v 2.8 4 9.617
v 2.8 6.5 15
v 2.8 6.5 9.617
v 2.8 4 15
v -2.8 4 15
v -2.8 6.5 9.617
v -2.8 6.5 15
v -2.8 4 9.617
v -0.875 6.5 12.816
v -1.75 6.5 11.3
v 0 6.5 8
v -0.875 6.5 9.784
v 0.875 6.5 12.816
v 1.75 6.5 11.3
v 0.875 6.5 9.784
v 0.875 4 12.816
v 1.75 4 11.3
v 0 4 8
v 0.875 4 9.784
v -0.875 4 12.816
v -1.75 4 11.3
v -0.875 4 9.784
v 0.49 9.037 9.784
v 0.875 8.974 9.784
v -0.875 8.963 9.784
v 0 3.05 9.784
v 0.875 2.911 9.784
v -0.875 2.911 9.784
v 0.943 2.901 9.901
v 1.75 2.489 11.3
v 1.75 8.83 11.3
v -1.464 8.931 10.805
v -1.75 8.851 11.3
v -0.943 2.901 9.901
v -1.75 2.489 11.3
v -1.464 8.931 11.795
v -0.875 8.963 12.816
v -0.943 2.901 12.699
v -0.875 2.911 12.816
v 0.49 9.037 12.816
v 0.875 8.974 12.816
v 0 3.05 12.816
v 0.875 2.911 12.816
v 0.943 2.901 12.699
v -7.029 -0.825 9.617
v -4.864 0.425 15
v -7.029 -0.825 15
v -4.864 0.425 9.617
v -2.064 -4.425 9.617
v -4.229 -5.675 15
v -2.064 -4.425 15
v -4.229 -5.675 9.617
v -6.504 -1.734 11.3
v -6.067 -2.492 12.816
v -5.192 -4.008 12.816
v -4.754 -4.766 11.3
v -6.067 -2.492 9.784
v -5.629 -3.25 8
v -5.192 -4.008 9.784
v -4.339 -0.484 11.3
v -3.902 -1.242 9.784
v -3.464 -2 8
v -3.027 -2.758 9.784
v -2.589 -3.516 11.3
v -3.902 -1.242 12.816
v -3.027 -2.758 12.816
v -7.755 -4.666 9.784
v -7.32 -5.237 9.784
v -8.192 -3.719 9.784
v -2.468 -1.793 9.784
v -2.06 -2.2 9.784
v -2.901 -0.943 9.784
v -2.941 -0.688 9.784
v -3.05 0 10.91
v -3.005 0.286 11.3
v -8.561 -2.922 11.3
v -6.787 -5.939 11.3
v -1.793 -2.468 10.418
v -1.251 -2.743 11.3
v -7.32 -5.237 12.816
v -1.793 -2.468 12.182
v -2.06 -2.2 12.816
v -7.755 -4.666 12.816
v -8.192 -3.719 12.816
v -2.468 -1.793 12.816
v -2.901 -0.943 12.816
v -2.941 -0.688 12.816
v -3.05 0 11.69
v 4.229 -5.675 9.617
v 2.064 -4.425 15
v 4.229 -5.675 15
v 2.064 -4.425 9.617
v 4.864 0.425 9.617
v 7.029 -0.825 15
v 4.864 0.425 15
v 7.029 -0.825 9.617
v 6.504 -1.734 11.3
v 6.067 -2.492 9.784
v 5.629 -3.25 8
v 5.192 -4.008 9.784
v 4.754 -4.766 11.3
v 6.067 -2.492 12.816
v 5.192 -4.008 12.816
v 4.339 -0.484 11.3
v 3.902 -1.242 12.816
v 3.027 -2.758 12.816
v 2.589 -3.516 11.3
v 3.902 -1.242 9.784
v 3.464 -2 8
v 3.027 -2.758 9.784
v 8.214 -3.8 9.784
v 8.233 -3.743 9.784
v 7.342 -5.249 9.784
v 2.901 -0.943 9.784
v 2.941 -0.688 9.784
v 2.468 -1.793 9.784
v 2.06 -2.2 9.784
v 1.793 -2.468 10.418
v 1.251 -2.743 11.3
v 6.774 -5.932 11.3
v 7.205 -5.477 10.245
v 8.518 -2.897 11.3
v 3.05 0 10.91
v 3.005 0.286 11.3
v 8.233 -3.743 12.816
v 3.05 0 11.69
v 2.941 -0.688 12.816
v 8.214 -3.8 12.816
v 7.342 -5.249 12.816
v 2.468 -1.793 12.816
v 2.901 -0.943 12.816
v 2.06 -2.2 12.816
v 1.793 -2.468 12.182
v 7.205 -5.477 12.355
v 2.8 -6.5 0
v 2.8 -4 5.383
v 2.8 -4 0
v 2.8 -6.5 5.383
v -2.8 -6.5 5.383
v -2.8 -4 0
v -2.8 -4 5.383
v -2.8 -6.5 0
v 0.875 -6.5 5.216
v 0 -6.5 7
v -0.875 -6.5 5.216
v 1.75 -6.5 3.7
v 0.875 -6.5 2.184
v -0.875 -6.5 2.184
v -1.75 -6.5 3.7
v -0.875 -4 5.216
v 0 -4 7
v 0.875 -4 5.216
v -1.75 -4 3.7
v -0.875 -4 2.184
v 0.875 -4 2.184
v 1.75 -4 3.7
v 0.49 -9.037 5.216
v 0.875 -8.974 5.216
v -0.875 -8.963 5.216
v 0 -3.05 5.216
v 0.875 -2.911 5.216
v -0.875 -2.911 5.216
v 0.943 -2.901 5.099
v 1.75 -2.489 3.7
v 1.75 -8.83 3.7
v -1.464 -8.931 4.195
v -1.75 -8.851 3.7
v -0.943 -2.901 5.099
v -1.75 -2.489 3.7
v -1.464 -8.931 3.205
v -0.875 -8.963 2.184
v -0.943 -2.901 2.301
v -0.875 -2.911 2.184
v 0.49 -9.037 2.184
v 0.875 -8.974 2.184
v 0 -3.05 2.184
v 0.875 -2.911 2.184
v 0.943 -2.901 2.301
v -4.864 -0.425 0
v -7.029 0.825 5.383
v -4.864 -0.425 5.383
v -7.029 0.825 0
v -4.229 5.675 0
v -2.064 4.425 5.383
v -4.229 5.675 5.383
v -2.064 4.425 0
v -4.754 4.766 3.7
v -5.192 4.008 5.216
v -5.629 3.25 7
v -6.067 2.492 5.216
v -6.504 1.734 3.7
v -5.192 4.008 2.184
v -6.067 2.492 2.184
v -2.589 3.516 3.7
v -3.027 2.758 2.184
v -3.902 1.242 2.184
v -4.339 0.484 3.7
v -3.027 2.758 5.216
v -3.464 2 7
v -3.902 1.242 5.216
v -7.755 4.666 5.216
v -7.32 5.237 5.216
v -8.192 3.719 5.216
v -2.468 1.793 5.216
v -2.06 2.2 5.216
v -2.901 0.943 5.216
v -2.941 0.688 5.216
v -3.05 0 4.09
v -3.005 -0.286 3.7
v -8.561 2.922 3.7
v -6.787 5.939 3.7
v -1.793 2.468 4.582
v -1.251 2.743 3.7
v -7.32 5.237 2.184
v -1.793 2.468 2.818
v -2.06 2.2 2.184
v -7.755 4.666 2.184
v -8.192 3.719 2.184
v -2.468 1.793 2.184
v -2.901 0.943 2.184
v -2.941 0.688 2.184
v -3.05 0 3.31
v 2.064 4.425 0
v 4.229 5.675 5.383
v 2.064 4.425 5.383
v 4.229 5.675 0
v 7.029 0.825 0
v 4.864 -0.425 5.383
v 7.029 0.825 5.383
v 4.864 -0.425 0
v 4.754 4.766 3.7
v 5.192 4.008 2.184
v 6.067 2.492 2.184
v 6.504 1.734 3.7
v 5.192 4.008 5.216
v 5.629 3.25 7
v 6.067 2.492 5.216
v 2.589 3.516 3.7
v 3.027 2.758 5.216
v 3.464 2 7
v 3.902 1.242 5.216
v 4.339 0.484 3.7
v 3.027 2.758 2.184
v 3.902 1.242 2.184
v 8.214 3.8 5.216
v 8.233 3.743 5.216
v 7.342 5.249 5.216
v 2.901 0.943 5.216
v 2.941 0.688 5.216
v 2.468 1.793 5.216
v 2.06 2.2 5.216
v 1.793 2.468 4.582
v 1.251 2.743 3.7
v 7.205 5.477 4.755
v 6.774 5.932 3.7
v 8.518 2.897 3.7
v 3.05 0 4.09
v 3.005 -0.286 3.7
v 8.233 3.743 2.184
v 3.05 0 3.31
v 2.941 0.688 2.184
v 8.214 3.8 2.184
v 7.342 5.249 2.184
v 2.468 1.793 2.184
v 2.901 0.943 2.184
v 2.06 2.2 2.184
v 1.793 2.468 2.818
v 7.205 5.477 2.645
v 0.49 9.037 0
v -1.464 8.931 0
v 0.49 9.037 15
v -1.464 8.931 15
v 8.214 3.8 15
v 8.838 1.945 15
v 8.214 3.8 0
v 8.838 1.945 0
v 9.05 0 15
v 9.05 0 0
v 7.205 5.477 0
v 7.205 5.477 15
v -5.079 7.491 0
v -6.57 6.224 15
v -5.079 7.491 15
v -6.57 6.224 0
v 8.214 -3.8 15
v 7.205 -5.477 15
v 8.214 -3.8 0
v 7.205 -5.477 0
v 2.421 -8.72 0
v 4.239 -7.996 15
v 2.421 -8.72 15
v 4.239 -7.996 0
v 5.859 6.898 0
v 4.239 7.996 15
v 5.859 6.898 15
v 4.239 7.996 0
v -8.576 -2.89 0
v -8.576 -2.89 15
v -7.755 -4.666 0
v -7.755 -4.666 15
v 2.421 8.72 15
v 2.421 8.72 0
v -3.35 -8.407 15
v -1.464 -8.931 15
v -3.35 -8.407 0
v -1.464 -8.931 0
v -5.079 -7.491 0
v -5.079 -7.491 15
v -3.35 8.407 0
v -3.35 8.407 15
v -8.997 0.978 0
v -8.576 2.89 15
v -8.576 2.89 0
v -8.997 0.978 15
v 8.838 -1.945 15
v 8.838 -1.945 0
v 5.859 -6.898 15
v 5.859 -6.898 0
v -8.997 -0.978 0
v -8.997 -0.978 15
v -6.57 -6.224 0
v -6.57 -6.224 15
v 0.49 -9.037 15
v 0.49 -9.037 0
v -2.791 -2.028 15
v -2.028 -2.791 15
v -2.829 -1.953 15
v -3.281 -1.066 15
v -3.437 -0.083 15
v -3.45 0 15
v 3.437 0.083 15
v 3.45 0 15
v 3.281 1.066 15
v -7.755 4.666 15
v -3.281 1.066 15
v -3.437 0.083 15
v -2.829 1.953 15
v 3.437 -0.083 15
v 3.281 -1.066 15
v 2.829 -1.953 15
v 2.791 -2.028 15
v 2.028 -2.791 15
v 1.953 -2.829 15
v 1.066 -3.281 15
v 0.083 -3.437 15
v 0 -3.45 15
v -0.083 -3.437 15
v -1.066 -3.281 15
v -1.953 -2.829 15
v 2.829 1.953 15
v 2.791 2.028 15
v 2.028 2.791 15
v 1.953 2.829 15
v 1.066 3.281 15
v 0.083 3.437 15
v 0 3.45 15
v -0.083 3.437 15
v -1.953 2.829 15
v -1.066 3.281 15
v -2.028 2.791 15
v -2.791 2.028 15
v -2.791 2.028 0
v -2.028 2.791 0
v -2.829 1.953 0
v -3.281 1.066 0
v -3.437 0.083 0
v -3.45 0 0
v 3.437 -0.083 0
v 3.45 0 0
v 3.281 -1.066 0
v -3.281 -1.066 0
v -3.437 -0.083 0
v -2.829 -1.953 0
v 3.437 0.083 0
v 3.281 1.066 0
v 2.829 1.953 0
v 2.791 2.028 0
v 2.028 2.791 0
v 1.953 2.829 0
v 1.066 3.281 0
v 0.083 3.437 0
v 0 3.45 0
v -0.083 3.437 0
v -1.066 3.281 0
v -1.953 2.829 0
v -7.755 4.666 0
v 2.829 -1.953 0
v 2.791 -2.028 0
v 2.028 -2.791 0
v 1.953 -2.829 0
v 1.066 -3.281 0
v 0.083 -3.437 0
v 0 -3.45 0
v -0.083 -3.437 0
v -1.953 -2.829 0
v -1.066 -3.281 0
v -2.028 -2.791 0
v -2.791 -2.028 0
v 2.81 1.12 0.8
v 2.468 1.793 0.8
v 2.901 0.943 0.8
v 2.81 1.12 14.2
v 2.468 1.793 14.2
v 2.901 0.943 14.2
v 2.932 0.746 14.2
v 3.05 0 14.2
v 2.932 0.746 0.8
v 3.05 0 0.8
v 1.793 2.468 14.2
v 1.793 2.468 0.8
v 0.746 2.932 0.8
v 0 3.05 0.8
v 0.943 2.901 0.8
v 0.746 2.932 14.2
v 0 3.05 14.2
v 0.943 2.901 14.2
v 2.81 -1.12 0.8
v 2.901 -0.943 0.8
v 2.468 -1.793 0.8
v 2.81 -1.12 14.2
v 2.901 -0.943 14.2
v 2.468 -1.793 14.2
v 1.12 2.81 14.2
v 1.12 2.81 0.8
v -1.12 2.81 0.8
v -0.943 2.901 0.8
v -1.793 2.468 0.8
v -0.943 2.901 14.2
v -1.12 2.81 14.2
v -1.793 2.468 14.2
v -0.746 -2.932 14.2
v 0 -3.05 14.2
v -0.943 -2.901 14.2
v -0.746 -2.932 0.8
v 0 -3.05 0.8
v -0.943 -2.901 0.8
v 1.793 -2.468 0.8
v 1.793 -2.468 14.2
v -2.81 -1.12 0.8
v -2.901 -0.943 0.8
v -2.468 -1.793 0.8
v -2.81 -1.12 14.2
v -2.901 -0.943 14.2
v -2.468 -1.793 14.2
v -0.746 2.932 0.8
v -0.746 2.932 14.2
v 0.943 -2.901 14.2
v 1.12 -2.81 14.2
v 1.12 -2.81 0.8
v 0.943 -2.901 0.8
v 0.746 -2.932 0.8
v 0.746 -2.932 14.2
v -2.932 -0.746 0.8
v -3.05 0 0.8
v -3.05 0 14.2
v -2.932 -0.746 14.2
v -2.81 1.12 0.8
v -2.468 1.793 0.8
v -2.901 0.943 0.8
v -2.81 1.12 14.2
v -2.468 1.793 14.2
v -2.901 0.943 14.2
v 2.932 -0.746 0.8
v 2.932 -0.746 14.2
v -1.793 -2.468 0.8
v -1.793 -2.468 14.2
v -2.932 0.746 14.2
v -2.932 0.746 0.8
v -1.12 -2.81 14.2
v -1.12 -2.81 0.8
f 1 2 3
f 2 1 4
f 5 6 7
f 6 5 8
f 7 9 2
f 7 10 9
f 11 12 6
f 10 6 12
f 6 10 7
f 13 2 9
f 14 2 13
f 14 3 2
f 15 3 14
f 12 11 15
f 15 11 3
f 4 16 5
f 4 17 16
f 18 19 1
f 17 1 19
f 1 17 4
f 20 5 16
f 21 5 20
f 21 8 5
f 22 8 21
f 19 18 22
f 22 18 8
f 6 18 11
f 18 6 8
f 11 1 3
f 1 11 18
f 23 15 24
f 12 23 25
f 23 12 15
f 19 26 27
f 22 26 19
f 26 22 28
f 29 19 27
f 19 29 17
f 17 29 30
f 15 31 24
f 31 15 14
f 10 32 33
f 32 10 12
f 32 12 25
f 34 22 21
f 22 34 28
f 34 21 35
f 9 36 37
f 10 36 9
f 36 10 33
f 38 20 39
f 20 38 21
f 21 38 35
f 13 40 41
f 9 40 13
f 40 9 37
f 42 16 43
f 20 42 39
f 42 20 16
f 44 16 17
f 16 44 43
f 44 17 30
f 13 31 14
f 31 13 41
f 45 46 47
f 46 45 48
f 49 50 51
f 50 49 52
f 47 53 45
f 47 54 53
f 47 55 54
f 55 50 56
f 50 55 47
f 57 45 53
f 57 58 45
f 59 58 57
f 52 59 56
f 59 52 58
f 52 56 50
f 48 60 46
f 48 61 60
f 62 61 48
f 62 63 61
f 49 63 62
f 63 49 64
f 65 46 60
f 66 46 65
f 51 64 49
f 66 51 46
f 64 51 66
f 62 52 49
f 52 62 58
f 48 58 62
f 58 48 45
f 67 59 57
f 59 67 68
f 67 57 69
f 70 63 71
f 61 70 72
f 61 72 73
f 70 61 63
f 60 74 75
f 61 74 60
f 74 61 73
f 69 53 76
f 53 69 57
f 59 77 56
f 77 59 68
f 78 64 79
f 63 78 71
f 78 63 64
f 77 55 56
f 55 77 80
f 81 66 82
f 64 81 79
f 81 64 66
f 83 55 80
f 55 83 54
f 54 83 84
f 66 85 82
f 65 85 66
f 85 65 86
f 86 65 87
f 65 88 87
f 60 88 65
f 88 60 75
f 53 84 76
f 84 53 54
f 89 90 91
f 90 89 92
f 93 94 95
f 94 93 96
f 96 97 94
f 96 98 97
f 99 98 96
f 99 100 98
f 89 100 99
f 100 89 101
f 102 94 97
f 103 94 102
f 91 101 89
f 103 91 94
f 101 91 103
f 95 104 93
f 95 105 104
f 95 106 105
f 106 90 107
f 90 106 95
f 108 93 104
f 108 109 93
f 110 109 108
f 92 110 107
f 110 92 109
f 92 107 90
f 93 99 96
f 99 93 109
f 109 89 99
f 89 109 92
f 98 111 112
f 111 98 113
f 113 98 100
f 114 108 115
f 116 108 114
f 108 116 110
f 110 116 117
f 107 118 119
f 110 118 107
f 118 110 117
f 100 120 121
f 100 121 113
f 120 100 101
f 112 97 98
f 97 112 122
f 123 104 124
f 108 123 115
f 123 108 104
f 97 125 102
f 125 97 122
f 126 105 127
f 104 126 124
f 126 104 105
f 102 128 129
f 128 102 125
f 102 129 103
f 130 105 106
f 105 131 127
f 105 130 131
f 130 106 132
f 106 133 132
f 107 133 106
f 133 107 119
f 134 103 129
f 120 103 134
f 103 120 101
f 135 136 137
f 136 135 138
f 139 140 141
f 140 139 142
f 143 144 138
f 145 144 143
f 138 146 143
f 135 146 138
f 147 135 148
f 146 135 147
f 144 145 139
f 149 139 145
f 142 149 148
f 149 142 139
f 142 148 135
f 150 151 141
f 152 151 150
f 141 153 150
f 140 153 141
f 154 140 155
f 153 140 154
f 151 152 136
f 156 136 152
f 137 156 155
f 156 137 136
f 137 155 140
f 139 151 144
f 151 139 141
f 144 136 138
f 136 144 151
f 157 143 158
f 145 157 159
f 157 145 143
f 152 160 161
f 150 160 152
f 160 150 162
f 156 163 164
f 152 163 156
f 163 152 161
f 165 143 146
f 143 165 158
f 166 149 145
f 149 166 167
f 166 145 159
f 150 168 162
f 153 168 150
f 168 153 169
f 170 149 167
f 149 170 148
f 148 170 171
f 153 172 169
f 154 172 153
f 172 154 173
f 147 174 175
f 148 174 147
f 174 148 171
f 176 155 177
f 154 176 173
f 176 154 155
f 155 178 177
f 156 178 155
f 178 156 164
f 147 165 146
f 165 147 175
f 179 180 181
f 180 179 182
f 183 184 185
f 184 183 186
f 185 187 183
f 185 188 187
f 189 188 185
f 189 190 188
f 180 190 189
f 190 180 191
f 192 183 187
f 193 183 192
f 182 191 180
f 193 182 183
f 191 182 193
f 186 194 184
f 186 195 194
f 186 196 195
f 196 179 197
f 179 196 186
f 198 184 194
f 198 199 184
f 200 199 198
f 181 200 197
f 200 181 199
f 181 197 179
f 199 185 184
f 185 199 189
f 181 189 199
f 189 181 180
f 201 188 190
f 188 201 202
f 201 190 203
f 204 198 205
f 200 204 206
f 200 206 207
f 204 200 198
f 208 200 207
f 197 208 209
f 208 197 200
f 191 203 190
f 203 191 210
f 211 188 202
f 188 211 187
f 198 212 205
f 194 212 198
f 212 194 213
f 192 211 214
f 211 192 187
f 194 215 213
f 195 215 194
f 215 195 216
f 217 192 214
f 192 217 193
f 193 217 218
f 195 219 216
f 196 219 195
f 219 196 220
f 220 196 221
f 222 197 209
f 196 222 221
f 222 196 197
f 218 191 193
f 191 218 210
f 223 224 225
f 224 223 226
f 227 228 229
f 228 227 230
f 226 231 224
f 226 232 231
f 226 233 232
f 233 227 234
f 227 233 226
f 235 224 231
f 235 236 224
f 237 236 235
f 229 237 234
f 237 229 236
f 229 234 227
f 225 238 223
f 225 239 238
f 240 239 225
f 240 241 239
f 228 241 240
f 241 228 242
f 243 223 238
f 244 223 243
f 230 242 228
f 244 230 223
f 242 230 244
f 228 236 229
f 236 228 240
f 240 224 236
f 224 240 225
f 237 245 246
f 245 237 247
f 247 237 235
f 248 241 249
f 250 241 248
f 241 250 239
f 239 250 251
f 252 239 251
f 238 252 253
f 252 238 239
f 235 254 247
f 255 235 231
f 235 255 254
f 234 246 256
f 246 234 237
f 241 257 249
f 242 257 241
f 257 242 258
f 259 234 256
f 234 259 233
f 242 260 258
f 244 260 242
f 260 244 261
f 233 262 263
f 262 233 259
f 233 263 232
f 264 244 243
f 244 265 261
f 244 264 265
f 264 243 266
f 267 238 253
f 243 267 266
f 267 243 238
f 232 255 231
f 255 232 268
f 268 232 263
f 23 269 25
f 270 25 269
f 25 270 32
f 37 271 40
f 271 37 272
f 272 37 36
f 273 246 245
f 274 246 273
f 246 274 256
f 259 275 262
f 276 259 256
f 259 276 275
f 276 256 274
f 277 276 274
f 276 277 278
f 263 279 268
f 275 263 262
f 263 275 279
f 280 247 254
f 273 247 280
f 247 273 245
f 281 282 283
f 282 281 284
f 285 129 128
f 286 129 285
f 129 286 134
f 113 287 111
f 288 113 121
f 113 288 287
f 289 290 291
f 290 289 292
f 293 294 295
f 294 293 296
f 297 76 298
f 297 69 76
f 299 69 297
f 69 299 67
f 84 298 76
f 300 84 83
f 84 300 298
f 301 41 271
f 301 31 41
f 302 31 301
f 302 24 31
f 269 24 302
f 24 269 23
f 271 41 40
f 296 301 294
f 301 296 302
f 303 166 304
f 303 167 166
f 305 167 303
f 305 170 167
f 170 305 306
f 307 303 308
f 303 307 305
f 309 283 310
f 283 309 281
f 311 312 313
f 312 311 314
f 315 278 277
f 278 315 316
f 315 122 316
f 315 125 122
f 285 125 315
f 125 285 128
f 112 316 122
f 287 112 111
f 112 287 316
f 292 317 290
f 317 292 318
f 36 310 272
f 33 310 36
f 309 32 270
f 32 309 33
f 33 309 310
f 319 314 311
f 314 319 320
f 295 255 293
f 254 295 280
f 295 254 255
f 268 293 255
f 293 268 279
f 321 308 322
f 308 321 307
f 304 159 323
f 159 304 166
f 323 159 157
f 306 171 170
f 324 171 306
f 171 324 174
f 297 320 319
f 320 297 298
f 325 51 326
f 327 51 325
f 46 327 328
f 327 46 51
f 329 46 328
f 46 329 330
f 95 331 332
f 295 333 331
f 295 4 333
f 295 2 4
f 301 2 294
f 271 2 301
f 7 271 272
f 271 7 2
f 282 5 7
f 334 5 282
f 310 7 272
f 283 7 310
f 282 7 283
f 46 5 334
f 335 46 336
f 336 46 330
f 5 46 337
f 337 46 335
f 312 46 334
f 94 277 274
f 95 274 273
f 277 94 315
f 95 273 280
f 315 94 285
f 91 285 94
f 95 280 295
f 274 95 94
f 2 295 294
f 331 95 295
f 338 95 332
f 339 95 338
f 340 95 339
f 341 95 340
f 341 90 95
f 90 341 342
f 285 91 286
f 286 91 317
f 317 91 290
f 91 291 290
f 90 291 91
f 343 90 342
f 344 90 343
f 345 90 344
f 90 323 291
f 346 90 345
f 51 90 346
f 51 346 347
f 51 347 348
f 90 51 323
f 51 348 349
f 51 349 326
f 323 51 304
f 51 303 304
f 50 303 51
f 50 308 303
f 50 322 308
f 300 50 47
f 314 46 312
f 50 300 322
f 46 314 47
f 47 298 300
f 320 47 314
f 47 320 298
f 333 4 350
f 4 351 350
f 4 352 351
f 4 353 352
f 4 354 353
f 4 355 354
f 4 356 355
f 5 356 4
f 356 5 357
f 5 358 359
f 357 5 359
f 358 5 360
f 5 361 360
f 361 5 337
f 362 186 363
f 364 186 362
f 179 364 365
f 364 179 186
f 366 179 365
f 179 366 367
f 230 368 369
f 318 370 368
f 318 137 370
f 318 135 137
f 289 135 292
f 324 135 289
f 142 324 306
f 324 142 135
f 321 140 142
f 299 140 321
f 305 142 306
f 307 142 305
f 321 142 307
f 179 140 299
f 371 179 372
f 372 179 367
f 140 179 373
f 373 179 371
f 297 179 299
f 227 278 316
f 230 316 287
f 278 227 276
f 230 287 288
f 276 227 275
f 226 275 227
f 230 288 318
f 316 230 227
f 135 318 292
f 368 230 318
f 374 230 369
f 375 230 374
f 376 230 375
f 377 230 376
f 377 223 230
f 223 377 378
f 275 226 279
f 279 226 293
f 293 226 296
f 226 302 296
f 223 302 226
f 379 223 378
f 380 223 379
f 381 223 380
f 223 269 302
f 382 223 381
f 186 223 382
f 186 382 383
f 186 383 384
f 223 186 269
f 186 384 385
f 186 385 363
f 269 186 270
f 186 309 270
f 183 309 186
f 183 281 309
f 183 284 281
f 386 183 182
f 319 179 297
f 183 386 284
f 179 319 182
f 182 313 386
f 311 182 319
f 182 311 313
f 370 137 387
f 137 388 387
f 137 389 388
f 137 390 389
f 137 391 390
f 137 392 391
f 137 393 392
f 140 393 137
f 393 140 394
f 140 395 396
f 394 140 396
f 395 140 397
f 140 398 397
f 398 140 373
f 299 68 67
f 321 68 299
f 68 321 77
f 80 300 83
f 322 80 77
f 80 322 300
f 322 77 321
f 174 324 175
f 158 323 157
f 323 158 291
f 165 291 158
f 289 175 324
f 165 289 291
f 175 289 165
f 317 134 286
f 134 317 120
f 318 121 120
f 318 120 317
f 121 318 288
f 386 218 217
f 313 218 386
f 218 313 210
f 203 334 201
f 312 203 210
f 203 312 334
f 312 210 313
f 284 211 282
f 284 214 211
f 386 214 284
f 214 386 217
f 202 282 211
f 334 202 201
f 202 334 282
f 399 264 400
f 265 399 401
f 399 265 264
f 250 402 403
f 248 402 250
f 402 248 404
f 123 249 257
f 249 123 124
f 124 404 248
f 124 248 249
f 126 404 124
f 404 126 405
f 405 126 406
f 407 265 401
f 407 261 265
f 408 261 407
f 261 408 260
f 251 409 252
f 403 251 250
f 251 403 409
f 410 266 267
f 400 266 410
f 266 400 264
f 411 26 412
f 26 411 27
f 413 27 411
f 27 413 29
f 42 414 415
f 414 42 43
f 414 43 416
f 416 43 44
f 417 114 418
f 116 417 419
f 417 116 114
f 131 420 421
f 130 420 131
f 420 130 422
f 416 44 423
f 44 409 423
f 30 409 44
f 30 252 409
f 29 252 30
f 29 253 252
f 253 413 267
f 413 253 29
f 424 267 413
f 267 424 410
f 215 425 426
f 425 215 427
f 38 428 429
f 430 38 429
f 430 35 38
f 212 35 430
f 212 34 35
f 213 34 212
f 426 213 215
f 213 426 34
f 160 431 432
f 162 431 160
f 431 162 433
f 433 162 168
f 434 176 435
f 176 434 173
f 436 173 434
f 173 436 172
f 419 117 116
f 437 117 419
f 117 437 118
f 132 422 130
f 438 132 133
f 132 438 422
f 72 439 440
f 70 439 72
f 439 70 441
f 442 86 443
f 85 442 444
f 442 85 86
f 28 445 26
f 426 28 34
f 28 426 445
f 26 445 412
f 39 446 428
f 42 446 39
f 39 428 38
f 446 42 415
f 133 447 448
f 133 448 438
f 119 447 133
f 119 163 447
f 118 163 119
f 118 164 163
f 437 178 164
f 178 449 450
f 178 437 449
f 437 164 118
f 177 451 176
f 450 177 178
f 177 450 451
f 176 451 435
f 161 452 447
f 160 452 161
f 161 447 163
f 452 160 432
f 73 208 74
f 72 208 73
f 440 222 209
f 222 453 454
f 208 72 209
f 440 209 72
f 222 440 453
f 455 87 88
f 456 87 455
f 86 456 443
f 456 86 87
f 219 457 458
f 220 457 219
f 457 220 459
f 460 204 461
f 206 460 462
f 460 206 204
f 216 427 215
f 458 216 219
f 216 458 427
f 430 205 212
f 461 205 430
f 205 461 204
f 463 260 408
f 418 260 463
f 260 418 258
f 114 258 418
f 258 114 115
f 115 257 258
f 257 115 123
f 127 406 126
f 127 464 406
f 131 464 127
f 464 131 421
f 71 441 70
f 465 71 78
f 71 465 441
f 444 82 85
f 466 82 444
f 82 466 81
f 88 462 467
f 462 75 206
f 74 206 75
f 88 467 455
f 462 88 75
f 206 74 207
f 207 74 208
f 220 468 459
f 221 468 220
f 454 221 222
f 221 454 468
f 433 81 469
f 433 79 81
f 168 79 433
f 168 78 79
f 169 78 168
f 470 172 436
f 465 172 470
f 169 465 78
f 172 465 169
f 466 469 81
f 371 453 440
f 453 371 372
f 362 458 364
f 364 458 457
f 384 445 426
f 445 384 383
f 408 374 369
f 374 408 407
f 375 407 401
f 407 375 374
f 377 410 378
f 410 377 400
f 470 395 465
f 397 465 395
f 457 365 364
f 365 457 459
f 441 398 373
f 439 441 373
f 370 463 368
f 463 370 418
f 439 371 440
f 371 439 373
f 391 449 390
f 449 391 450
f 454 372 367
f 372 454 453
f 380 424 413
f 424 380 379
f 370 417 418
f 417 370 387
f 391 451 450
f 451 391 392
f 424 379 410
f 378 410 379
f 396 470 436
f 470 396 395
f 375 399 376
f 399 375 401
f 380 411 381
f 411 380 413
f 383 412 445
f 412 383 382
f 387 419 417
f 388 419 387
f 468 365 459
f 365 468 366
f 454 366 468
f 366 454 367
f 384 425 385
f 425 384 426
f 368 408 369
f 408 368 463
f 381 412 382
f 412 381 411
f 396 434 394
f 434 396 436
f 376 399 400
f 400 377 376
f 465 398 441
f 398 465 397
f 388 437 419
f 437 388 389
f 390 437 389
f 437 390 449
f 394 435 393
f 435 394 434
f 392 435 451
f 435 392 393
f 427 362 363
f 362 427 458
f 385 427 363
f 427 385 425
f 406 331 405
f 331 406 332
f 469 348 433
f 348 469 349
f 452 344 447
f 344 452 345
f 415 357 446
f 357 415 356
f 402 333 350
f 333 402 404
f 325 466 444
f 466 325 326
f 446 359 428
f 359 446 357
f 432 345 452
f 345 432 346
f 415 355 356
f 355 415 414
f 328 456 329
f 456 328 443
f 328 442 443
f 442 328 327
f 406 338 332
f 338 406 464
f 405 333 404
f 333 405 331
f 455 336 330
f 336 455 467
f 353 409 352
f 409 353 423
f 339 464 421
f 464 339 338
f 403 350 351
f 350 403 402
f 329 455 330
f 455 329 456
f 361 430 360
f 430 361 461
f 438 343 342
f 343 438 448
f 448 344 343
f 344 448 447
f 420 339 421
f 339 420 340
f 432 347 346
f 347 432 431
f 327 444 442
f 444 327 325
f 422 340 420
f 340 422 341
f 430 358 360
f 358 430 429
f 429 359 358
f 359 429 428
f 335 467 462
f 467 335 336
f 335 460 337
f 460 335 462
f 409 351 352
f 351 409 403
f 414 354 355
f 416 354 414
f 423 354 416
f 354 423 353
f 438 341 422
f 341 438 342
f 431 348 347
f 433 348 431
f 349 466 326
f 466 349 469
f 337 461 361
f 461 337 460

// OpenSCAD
// file: parameters.scad
// Parameters shared between modules
Base_th = 2.8;
Beam_width = 15;
Wiggle = 0.25;
Fat_beam_width = Beam_width + Wiggle;
Beam_length = 400;
Wall_th = 2.5;
Min_beam_width = 12.5;
Max_beam_width = 17.5;
Zip_th = 2;
Zip_h = Zip_th + Max_beam_width - Min_beam_width;
Zip_w = 5.0;
Nema17_cube_width          = 42.43;
Nema17_screw_hole_width    = 43.74; // Opposite corner screws
Nema17_ring_diameter       = 22;
Nema17_cube_height         = 39.36;
Nema17_shaft_height        = 63.65;
Nema17_ring_height         = 2;
Nema17_shaft_radius        = 5/2;
b608_outer_dia = 22.2;
b608_width = 7.05;
Gap_between_sandwich_and_plate = 1.5 + Base_th; // 1.5 mm for wiggle
Motor_bracket_flerp_r = 6;
Motor_bracket_flerp = 14;
Motor_bracket_cw = Nema17_cube_width + 6;
Motor_bracket_att_ang = 50;
Mounting_screw_d = 4.5;
Mounting_screw_head_d = 14;
Spool_outer_wall_th = 4;

// Corner clamp parameters
Cc_l1 = (Fat_beam_width+2*Wall_th)*2*sqrt(3);
Cc_rad_b = 4;
Cc_action_point_from_mid = Cc_l1/sqrt(3)-2*Cc_rad_b-1.3;  // 1.3 chosen arbitrarily
Cc_plastic_length = sqrt(Cc_action_point_from_mid*Cc_action_point_from_mid
                       - (Cc_action_point_from_mid/2)*(Cc_action_point_from_mid/2));

// The distance between the two action points on the mover
Sidelength = Beam_length + 2*Cc_plastic_length;

/////// Layout parameters ////////////
Ext_sidelength = Sidelength+77;
Additional_added_plate_side_length = 10;
Yshift_top_plate = -25;

/////// Gear parameters ////////////
Circular_pitch = 262;
Motor_teeth = 10;
Gear_height = 21.4-3;
Motor_pitch                      = (Motor_teeth*Circular_pitch/360);
Motor_pitch_diametrial           = Motor_teeth/(2*Motor_pitch);
Motor_outer_radius               = Motor_pitch + 1/Motor_pitch_diametrial;
Spool_teeth = 100;
Spool_r = 55;
Spool_height = 8;
Spool_pitch                      = (Spool_teeth*Circular_pitch/360);
Spool_pitch_diametrial           = Spool_teeth/(2*Spool_pitch);
Spool_outer_radius               = Spool_pitch + 1/Spool_pitch_diametrial;
Torx_depth = 5;
Motor_bracket_depth = Gear_height+1+7+Nema17_ring_height+1+Gap_between_sandwich_and_plate;
Spool_core_flerp0 = 16+3;

/////// Lineroller parameters ////////////
b623_width  = 4;
b623_bore_r = 3/2;
b623_vgroove_big_r = 12/2;
b623_vgroove_small_r = 10/2;
Lineroller_wall_th = 2.3;


// The height that lineroller_ABC_winch will have if we include the bearing
Tower_h = Gap_between_sandwich_and_plate+Gear_height
         + Spool_height/2
         + b623_vgroove_small_r
         + b623_vgroove_big_r;
Bearing_wall = 1;
Depth_of_lineroller_tower = b623_width + 2*Wall_th; // 9
Depth_of_lineroller_base = Depth_of_lineroller_tower + 9; // 18
Ptfe_r = 2.1;
Lineroller_base_r = Depth_of_lineroller_base/2-1*(Ptfe_r+2);
Screw_h = 2;
Screw_head_h = 2;
Spool_center_bearing_wall_th = 5;
Idler_block_bearing_center_to_center = 15;

//// Lineroller anchor parameters /////

Bearing_0_x = 2*b623_vgroove_big_r+Bearing_wall+5.3;
Bearing_1_x = b623_vgroove_small_r-0.9;
Move_tower = -12.2;
Lower_bearing_z = 13;
Higher_bearing_z = Lower_bearing_z + Idler_block_bearing_center_to_center;


//// Donkey and encoder parameters /////

Donkey_shaft_d = 6;
Donkey_h = 65.12;
Donkey_body_d = 50;
Donkey_feet_th = 3.5;

Encoder_LDP3806_shaft_d = 6;
Encoder_LDP3806_d = 38;


//// Cable Clamp parameters /////

Bit_width = 12;
Cable_r=2.5;
// file: donkey.scad
use <util.scad>
include <parameters.scad>

module encoder_screw_hole_translate(twist=0){
  rotate([0,0,twist])
    for(rot=[0:120:359])
      rotate([0,0,rot])
        for(k=[1,-1])
          translate([14, k*7.5/2, 34 - 10])
            children();
}

module encoder_screw_holes(h = 11){
  encoder_screw_hole_translate()
    cylinder(d=3, h=h); // screw holes
}

module donkey_screw_hole_translate(){
  for(rot=[0:90:359])
    rotate([0,0,rot])
      translate([0,56/2 + 6/2,-1])
        children();
}

module donkey_screw_holes(){
  donkey_screw_hole_translate()
    rotate([0,0,90]) // center these round ends...
    translate([-3, -4.5/2, 0])
    round_ends([6, 4.5, 3.5 + 2], $fn=14);
}

//donkey();
module donkey(){
  difference(){
    cylinder(d = 73,h = 12);
    translate([0,0,Donkey_feet_th])
    rotate_extrude()
      translate([73/2-9.6,0])
      square(12);
    for(rot=[0:90:359])
      rotate([0,0,rot]){
        translate([5,5,-1])
          rounded_cube2([73,73,12+2], 10, $fn=4*7);
      }
    donkey_screw_holes();
    translate([0,0,-1])
      cylinder(d = 46, h = 8.7 + 1);
  }
  translate([0, 0, 13.3]){
    color("dimgray"){
      cylinder(d = Donkey_body_d, h = 23);
      cylinder(d = 18, h = 23 + 5.6);
    }
    cylinder(d = Donkey_shaft_d, h = 23 + 5.6 + 23.22);
  }
}
// main file
use <util.scad>
use <donkey.scad>
include <parameters.scad>

//encoder_LDP3806();
module encoder_LDP3806(){
  difference(){
    union(){
      color("slategrey")
        cylinder(d = Encoder_LDP3806_d, h = 32);     // black body
      translate([0,0,1])
        cylinder(d = Encoder_LDP3806_d - 0.1, h = 34-1); // shiny body
    }
    encoder_screw_holes();
  }
  translate([0,0,1]){
    difference(){
      cylinder(d = 20, h = 34 + 5 - 1);
      translate([0, 0, 34 + 5 - 1.5])
        cylinder(d = 15, h = 10 - 1);  // down to bearing
    }
    difference(){
      cylinder(d = Encoder_LDP3806_shaft_d, h = 51.3 - 1, $fn=20); // shaft
      translate([-2, 2.5, 51.3 - 10 - 1])
        cube([4,2,10 + 1]);              // D-side of shaft
    }
  }
}

donkey_encoder_coupler();
module donkey_encoder_coupler(h = 15){
  //!nutz();
  module nutz(){
  for(k=[0,120,240])
    rotate([0,0,k]){
      translate([0, Encoder_LDP3806_shaft_d/2 + 1.0, 0])
        nutlock();
    }
  }

  difference(){
    cylinder(d = Encoder_LDP3806_shaft_d + 6.05*2, h=h);
    translate([0, 0, -1])
      cylinder(d = Encoder_LDP3806_shaft_d + 0.1, h=h+2, $fn=20);
    translate([0,0,h - 7])
      nutz();
    translate([0,0,7])
      rotate([180, 0, 0])
        nutz();
    translate([0,0,-0.1])
      cylinder(d1 = Encoder_LDP3806_shaft_d + 1,
               d2 = Encoder_LDP3806_shaft_d - 0.1,
               h = 1.1,
               $fn = 20); // phase in
    translate([0,0,h-1.1+0.1])
      cylinder(d2 = Encoder_LDP3806_shaft_d + 1,
               d1 = Encoder_LDP3806_shaft_d - 0.1,
               h = 1.1,
               $fn = 20); // phase in

  }
}

//render_it();
module render_it(){
  donkey();
  translate([0,0,Donkey_h-6])
    import("../openscad_stl/donkey_encoder_coupler.stl");
  //donkey_encoder_coupler();
  translate([0,0,117])
    rotate([0,180,0])
    encoder_LDP3806();
}
